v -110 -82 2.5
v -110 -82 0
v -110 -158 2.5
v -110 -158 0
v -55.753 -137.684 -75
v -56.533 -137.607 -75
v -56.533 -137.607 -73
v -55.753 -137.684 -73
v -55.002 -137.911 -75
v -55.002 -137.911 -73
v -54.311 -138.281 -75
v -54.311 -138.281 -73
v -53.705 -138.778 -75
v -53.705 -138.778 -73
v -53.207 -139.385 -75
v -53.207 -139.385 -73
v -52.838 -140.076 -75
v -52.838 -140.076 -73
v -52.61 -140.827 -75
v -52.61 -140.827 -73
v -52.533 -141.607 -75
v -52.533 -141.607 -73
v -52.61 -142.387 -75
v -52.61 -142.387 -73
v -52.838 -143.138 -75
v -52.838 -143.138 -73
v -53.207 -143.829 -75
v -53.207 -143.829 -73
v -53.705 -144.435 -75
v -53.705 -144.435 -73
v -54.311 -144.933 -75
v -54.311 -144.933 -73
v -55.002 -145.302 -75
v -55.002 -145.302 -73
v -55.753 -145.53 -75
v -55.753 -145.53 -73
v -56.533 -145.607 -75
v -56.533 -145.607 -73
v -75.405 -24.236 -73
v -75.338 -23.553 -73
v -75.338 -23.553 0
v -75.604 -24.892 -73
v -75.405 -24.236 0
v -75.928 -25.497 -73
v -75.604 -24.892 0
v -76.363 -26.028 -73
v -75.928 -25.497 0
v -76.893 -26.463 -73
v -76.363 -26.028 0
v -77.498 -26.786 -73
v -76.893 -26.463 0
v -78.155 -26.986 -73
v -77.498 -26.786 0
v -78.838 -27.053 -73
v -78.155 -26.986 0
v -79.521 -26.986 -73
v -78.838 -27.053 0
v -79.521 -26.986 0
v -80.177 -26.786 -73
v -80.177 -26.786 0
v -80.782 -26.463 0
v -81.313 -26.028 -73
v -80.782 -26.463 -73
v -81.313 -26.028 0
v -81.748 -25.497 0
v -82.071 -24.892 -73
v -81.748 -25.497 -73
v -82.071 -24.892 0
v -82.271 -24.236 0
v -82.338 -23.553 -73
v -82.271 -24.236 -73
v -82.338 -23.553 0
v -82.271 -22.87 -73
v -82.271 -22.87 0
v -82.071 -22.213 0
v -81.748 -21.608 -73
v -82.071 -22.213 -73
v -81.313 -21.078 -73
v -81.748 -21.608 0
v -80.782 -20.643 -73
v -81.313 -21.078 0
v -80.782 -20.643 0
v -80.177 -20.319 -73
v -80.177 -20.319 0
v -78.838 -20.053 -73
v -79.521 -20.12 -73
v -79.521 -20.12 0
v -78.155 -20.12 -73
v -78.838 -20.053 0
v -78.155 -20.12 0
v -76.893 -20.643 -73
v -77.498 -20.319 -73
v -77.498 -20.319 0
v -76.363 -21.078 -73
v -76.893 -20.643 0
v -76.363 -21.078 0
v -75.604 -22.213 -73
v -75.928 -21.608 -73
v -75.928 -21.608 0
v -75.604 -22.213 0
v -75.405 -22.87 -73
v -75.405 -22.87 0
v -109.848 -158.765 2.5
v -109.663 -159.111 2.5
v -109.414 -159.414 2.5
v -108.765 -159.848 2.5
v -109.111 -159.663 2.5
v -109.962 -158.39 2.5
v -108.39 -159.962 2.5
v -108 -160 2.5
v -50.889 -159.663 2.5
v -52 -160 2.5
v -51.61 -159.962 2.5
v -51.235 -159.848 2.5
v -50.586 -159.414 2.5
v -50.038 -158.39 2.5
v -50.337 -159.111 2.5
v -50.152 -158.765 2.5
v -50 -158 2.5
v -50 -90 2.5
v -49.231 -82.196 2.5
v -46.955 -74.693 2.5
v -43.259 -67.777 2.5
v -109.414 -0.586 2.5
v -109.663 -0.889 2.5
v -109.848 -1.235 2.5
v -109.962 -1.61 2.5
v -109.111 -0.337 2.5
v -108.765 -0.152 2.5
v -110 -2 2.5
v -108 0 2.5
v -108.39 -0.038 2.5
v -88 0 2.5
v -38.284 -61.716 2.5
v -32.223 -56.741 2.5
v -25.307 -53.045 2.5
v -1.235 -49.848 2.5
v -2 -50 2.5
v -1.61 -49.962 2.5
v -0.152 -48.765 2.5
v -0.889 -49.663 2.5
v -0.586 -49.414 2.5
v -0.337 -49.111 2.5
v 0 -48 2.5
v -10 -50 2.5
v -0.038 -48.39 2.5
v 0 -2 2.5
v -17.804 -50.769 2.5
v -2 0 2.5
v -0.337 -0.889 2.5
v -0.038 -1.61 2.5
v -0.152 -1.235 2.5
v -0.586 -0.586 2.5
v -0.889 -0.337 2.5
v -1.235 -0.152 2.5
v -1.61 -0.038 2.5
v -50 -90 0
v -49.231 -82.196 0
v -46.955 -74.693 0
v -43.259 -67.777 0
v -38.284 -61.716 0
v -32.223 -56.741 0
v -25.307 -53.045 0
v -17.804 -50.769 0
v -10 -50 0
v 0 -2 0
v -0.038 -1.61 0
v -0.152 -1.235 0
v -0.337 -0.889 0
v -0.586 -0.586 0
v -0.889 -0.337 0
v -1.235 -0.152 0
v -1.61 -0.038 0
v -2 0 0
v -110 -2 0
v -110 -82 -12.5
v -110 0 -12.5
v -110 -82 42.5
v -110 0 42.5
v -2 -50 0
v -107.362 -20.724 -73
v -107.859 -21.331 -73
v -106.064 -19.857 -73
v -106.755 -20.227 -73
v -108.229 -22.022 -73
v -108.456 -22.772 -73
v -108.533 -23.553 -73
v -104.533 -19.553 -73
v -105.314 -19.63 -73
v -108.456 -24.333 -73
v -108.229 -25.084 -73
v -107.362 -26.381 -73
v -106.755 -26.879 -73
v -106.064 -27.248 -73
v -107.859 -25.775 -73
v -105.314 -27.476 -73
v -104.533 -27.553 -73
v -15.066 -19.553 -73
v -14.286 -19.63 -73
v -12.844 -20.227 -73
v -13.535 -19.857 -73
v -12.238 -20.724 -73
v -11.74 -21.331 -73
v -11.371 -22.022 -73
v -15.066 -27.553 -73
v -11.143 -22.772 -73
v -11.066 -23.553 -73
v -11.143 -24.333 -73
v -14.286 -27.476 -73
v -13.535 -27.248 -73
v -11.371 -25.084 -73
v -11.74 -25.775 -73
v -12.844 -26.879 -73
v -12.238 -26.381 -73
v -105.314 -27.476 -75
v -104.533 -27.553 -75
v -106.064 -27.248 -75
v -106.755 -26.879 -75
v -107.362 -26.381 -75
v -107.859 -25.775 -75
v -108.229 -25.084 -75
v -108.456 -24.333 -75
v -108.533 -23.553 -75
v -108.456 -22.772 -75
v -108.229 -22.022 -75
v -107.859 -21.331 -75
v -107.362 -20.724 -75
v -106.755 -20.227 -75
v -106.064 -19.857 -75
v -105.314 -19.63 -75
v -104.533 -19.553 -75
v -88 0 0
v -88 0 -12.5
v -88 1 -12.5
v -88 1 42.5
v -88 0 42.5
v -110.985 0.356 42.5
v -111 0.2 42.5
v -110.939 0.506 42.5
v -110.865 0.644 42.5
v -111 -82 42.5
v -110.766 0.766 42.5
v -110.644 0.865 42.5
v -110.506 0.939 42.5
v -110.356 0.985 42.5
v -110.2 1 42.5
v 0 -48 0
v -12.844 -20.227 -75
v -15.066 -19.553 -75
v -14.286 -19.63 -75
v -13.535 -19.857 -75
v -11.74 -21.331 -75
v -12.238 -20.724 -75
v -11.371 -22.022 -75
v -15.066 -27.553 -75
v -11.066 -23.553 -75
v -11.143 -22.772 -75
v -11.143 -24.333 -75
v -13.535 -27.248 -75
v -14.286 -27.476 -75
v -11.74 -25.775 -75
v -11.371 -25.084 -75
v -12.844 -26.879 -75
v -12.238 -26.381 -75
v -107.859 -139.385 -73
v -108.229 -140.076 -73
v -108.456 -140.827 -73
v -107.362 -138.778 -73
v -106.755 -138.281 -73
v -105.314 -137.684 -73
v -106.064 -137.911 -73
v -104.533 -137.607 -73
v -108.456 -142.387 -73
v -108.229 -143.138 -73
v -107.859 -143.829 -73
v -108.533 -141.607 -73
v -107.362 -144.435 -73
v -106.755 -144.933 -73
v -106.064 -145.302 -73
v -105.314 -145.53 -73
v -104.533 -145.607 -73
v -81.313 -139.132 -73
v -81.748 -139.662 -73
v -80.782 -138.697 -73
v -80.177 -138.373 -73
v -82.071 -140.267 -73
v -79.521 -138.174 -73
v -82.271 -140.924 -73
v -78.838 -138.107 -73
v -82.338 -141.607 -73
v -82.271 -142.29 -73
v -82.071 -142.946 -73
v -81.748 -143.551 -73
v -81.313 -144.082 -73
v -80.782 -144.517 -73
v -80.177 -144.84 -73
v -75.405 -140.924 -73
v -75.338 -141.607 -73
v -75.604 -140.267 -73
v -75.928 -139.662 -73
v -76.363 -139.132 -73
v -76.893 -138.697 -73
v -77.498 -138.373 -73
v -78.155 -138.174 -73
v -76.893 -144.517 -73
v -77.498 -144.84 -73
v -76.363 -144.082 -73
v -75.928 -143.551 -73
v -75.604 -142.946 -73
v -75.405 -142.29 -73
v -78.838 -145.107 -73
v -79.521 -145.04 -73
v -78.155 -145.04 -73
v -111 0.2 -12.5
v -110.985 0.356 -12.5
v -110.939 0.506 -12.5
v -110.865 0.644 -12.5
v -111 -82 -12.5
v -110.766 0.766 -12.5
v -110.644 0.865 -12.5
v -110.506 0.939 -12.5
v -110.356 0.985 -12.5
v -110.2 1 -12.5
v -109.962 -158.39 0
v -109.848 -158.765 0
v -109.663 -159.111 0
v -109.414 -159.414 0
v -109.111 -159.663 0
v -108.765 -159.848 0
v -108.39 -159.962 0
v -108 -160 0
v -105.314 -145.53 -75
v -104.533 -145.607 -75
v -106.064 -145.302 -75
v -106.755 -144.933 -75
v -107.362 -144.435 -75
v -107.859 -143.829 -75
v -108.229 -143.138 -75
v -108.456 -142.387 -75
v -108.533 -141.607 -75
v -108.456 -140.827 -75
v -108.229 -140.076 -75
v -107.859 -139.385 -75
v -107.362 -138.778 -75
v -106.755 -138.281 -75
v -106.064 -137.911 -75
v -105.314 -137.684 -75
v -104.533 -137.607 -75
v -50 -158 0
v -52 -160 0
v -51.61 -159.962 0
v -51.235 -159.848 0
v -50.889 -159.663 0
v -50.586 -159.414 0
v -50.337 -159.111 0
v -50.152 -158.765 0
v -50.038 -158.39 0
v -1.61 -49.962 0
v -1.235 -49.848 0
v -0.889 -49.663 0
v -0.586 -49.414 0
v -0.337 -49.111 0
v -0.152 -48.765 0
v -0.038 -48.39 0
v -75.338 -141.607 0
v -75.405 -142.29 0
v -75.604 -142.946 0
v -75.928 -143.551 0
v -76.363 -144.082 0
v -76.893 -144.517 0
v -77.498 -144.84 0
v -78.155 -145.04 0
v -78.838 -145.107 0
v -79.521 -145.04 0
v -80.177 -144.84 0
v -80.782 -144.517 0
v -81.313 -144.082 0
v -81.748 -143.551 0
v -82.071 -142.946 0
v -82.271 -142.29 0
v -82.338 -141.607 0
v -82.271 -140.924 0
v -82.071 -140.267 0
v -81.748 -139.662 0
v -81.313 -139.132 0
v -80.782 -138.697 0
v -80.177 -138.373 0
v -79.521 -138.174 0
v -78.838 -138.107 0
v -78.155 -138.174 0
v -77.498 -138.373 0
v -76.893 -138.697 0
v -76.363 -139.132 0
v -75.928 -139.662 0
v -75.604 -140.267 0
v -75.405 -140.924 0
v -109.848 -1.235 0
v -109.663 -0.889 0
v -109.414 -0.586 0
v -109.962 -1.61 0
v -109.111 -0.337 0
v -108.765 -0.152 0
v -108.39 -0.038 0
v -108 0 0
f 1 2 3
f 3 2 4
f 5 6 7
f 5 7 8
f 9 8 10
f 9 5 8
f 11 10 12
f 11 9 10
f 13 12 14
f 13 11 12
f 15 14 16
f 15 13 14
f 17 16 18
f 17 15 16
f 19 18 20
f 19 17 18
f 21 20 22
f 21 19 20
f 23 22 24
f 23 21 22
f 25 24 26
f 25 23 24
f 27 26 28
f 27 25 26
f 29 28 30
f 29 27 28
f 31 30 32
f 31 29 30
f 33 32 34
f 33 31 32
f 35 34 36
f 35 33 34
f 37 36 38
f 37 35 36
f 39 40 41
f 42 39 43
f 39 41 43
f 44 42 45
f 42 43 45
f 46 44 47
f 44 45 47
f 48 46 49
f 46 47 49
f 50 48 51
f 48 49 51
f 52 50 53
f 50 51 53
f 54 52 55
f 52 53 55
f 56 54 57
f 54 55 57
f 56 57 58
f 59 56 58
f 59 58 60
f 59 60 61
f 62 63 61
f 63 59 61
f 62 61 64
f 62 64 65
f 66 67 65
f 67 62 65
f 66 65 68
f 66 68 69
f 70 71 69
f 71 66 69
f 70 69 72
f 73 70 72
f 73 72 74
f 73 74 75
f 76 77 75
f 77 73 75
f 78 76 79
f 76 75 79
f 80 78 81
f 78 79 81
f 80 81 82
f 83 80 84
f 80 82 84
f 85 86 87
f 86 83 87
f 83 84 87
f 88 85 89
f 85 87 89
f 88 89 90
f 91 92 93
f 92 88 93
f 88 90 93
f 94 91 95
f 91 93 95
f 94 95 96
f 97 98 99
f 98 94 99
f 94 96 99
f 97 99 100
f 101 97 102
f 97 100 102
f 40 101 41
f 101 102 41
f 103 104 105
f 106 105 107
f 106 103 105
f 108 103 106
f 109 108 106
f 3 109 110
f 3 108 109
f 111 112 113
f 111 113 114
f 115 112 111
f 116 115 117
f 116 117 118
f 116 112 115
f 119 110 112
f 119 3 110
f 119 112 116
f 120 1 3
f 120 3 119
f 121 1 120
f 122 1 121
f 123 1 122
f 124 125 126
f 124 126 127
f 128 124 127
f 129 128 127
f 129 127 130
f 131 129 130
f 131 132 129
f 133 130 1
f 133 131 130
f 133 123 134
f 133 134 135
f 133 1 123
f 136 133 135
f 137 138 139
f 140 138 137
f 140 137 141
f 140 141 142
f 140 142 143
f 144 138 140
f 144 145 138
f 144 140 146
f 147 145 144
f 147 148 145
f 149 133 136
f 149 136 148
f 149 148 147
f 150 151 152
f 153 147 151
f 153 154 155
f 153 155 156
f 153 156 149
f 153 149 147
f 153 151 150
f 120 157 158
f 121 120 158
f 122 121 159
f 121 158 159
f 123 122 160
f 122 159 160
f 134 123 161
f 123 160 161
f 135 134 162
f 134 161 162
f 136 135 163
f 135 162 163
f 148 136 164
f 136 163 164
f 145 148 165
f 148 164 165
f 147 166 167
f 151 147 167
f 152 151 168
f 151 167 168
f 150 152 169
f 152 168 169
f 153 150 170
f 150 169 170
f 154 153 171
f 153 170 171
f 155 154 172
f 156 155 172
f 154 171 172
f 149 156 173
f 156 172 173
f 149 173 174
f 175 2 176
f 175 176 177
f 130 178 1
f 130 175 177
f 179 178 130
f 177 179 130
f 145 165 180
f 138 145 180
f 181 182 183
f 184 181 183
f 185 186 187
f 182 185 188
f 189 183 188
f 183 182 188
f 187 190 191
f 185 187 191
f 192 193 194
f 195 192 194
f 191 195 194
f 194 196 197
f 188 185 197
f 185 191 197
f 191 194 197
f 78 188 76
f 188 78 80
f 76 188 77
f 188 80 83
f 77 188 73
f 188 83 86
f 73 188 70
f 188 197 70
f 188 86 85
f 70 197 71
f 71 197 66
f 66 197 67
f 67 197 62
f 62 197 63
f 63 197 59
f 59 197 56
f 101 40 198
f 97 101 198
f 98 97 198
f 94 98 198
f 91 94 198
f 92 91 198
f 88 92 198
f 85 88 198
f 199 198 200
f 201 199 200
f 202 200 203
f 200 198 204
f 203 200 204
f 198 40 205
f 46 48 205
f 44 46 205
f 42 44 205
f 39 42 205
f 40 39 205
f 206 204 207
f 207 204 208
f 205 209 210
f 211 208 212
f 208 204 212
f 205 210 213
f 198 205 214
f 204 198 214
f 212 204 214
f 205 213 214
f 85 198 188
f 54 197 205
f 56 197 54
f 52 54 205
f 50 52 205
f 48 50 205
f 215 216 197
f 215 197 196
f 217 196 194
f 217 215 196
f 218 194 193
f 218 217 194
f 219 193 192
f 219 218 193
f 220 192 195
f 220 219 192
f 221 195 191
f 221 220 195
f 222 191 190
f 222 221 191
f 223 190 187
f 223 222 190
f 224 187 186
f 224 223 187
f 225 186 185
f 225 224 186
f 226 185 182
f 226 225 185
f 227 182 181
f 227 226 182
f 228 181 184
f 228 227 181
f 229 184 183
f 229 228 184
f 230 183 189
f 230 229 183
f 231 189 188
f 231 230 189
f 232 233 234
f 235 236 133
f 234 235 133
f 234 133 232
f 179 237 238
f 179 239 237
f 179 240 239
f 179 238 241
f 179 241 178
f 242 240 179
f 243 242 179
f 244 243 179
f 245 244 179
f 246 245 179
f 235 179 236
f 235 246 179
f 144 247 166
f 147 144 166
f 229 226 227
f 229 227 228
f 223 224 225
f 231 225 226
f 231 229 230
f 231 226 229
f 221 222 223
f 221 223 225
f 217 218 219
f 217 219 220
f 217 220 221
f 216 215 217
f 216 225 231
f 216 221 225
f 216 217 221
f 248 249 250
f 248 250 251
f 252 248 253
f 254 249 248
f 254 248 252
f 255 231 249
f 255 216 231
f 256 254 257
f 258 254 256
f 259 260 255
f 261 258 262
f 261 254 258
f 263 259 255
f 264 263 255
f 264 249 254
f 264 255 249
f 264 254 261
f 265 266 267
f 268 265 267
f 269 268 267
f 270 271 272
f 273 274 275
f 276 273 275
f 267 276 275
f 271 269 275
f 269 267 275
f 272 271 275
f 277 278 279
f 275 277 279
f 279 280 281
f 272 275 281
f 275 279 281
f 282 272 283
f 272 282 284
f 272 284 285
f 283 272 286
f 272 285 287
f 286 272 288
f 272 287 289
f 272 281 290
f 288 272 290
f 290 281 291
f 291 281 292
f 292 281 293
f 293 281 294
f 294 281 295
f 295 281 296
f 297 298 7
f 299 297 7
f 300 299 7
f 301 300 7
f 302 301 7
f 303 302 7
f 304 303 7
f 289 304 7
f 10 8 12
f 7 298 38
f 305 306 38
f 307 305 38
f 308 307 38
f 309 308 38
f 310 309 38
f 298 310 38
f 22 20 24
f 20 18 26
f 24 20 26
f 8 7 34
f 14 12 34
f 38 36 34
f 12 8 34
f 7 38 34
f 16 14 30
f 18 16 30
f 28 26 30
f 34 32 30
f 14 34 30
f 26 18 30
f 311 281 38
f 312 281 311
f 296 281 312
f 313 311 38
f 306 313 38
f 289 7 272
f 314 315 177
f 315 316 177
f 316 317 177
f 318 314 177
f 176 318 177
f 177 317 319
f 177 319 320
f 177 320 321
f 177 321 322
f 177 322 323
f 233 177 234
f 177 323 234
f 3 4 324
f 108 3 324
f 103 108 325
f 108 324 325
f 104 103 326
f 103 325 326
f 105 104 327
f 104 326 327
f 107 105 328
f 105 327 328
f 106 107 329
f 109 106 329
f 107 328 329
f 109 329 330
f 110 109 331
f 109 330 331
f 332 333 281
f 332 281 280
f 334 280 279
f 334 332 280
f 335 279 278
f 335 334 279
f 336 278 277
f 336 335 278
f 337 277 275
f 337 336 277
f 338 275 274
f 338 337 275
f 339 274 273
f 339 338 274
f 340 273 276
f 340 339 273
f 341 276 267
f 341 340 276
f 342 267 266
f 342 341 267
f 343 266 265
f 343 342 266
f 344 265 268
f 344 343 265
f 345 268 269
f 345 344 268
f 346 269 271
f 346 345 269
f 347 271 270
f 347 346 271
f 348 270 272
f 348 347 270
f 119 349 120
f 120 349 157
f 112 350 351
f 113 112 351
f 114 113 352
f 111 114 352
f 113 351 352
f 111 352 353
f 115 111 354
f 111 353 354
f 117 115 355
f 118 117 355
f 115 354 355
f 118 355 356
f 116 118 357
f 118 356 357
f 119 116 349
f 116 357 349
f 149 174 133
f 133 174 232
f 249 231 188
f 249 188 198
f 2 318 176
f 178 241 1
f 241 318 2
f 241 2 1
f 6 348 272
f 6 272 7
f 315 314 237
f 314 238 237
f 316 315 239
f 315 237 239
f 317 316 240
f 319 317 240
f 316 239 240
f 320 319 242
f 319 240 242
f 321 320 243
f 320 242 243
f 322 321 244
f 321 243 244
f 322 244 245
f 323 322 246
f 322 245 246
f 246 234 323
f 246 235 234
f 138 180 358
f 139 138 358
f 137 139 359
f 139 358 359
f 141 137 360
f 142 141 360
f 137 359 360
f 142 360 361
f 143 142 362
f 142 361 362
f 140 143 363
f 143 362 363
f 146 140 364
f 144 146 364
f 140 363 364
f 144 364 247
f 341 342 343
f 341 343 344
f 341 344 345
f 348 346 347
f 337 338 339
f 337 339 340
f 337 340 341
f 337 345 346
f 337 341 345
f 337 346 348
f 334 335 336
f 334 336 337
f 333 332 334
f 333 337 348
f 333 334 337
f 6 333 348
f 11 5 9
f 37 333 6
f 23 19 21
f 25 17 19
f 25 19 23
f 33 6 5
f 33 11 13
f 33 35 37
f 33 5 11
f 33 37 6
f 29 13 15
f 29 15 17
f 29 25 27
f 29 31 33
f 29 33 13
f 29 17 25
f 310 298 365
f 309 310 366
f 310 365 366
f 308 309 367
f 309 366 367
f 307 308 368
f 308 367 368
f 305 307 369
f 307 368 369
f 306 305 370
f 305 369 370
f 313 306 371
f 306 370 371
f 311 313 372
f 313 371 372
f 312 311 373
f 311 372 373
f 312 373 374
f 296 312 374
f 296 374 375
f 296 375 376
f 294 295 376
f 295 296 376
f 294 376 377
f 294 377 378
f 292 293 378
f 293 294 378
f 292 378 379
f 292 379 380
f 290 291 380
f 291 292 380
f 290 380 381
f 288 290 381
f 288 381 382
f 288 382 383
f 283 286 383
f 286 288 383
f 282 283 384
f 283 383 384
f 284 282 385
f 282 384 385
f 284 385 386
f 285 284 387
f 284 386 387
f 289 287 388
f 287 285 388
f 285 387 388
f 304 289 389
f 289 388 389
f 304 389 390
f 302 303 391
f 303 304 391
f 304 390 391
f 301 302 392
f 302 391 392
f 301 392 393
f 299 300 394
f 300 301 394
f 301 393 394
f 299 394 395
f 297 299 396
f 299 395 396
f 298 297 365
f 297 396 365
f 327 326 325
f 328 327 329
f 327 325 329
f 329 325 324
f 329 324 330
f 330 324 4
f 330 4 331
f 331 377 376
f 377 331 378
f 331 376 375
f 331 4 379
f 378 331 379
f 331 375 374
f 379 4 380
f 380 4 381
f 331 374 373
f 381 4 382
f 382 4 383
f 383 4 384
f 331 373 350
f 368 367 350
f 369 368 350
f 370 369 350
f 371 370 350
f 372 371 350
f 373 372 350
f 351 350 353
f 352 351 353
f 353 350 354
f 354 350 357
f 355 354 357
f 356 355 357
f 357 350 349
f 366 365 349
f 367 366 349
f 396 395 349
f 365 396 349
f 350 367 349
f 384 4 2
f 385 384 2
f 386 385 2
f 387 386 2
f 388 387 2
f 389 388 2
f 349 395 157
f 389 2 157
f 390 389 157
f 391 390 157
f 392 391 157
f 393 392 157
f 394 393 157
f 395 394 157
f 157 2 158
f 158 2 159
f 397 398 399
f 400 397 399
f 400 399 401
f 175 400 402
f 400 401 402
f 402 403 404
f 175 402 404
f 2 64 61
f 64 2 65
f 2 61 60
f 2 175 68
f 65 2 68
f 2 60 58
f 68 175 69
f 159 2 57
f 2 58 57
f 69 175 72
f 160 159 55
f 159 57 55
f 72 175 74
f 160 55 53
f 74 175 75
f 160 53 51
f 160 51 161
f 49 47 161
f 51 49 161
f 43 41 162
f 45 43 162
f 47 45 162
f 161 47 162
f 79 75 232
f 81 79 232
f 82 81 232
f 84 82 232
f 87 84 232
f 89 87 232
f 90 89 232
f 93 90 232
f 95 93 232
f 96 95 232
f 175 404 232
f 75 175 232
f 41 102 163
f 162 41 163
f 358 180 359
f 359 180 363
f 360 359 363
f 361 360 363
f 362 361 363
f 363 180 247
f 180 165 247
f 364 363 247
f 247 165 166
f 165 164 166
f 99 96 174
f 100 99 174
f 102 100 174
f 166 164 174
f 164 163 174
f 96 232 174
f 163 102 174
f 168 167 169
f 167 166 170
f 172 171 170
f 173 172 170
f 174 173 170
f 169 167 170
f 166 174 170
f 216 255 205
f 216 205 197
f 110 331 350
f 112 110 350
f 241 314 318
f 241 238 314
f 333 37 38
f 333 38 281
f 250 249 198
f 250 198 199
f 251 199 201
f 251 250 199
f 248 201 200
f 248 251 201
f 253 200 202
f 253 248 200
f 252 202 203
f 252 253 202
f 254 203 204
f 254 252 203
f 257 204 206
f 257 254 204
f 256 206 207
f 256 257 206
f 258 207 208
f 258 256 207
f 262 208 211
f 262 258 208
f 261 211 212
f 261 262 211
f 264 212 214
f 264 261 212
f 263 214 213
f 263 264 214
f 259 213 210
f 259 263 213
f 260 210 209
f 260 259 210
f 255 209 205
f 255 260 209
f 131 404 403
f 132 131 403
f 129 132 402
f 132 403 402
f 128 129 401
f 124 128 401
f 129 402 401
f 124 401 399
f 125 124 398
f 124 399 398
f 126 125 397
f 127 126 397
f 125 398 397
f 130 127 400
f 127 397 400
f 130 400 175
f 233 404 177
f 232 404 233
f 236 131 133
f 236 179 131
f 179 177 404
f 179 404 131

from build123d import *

# Parameters (mm, degrees)
F1_DEPTH      = 2.5
F2_R          = 3.5
F3_DEPTH      = 75
F5_DEPTH      = 2
F7_DEPTH      = 40
F7_DEPTH_BACK = 15
F8_R          = 0.8


with BuildPart() as f1:
    # F0 (on Top) → F1 (new body)
    with BuildSketch(Plane.XY):
        with BuildLine():
            ThreePointArc((0, -2), (-0.585786, -0.585786), (-2, 0))
            Line((-2, 0), (-108, 0))
            ThreePointArc((-108, 0), (-109.414214, -0.585786), (-110, -2))
            Line((-110, -2), (-110, -158))
            ThreePointArc((-110, -158), (-109.414214, -159.414214), (-108, -160))
            Line((-108, -160), (-52, -160))
            ThreePointArc((-52, -160), (-50.585786, -159.414214), (-50, -158))
            Line((-50, -158), (-50, -90))
            ThreePointArc((-50, -90), (-38.284271, -61.715729), (-10, -50))
            Line((-10, -50), (-2, -50))
            ThreePointArc((-2, -50), (-0.585786, -49.414214), (0, -48))
            Line((0, -48), (0, -2))
        make_face()
    extrude(amount=F1_DEPTH)

    # F2 (on face) → F3 (join)
    with BuildSketch(Plane(origin=(0, 0, 0), x_dir=(1, 0, 0), z_dir=(0, 0, -1))):
        with Locations((-78.837842, 141.606882)):
            Circle(F2_R)
        with Locations((-78.837842, 23.552824)):
            Circle(F2_R)
    extrude(amount=F3_DEPTH)

    # F4 (on face) → F5 (join)
    with BuildSketch(Plane(origin=(0, 0, -75), x_dir=(1, 0, 0), z_dir=(0, 0, -1))):
        with BuildLine():
            ThreePointArc((-56.533181, 137.606882), (-52.533181, 141.606882), (-56.533181, 145.606882))
            Line((-56.533181, 145.606882), (-104.533181, 145.606882))
            ThreePointArc((-104.533181, 145.606882), (-108.533181, 141.606882), (-104.533181, 137.606882))
            Line((-104.533181, 137.606882), (-56.533181, 137.606882))
        make_face()
        with BuildLine():
            ThreePointArc((-82.337842, 141.606882), (-78.837842, 145.106882), (-75.337842, 141.606882))
            ThreePointArc((-75.337842, 141.606882), (-78.837842, 138.106882), (-82.337842, 141.606882))
        make_face(mode=Mode.SUBTRACT)
        with BuildLine():
            ThreePointArc((-104.533181, 27.552824), (-108.533181, 23.552824), (-104.533181, 19.552824))
            Line((-104.533181, 19.552824), (-15.066023, 19.552824))
            ThreePointArc((-15.066023, 19.552824), (-11.066023, 23.552824), (-15.066023, 27.552824))
            Line((-15.066023, 27.552824), (-104.533181, 27.552824))
        make_face()
        with BuildLine():
            ThreePointArc((-82.337842, 23.552824), (-78.837842, 27.052824), (-75.337842, 23.552824))
            ThreePointArc((-75.337842, 23.552824), (-78.837842, 20.052824), (-82.337842, 23.552824))
        make_face(mode=Mode.SUBTRACT)
        with BuildLine():
            ThreePointArc((-82.337842, 23.552824), (-78.837842, 20.052824), (-75.337842, 23.552824))
            Line((-75.337842, 23.552824), (-82.337842, 23.552824))
        make_face()
    extrude(amount=-F5_DEPTH)

    # F6 (on face) → F7 (join, two sides)
    with BuildSketch(Plane.XY.offset(2.5)) as f7_sk:
        Polygon((-108, 0), (-88, 0), (-88, 1), (-111, 1), (-111, -82), (-110, -82), (-110, -2), (-110, 0), align=None)
    extrude(amount=F7_DEPTH)
    extrude(f7_sk.sketch, amount=-F7_DEPTH_BACK)

    # F8
    f8_edges = [f1.edges().sort_by_distance(p)[0] for p in [
        (-111, 1, 15),
    ]]
    fillet(f8_edges, radius=F8_R)


solid = f1.part
